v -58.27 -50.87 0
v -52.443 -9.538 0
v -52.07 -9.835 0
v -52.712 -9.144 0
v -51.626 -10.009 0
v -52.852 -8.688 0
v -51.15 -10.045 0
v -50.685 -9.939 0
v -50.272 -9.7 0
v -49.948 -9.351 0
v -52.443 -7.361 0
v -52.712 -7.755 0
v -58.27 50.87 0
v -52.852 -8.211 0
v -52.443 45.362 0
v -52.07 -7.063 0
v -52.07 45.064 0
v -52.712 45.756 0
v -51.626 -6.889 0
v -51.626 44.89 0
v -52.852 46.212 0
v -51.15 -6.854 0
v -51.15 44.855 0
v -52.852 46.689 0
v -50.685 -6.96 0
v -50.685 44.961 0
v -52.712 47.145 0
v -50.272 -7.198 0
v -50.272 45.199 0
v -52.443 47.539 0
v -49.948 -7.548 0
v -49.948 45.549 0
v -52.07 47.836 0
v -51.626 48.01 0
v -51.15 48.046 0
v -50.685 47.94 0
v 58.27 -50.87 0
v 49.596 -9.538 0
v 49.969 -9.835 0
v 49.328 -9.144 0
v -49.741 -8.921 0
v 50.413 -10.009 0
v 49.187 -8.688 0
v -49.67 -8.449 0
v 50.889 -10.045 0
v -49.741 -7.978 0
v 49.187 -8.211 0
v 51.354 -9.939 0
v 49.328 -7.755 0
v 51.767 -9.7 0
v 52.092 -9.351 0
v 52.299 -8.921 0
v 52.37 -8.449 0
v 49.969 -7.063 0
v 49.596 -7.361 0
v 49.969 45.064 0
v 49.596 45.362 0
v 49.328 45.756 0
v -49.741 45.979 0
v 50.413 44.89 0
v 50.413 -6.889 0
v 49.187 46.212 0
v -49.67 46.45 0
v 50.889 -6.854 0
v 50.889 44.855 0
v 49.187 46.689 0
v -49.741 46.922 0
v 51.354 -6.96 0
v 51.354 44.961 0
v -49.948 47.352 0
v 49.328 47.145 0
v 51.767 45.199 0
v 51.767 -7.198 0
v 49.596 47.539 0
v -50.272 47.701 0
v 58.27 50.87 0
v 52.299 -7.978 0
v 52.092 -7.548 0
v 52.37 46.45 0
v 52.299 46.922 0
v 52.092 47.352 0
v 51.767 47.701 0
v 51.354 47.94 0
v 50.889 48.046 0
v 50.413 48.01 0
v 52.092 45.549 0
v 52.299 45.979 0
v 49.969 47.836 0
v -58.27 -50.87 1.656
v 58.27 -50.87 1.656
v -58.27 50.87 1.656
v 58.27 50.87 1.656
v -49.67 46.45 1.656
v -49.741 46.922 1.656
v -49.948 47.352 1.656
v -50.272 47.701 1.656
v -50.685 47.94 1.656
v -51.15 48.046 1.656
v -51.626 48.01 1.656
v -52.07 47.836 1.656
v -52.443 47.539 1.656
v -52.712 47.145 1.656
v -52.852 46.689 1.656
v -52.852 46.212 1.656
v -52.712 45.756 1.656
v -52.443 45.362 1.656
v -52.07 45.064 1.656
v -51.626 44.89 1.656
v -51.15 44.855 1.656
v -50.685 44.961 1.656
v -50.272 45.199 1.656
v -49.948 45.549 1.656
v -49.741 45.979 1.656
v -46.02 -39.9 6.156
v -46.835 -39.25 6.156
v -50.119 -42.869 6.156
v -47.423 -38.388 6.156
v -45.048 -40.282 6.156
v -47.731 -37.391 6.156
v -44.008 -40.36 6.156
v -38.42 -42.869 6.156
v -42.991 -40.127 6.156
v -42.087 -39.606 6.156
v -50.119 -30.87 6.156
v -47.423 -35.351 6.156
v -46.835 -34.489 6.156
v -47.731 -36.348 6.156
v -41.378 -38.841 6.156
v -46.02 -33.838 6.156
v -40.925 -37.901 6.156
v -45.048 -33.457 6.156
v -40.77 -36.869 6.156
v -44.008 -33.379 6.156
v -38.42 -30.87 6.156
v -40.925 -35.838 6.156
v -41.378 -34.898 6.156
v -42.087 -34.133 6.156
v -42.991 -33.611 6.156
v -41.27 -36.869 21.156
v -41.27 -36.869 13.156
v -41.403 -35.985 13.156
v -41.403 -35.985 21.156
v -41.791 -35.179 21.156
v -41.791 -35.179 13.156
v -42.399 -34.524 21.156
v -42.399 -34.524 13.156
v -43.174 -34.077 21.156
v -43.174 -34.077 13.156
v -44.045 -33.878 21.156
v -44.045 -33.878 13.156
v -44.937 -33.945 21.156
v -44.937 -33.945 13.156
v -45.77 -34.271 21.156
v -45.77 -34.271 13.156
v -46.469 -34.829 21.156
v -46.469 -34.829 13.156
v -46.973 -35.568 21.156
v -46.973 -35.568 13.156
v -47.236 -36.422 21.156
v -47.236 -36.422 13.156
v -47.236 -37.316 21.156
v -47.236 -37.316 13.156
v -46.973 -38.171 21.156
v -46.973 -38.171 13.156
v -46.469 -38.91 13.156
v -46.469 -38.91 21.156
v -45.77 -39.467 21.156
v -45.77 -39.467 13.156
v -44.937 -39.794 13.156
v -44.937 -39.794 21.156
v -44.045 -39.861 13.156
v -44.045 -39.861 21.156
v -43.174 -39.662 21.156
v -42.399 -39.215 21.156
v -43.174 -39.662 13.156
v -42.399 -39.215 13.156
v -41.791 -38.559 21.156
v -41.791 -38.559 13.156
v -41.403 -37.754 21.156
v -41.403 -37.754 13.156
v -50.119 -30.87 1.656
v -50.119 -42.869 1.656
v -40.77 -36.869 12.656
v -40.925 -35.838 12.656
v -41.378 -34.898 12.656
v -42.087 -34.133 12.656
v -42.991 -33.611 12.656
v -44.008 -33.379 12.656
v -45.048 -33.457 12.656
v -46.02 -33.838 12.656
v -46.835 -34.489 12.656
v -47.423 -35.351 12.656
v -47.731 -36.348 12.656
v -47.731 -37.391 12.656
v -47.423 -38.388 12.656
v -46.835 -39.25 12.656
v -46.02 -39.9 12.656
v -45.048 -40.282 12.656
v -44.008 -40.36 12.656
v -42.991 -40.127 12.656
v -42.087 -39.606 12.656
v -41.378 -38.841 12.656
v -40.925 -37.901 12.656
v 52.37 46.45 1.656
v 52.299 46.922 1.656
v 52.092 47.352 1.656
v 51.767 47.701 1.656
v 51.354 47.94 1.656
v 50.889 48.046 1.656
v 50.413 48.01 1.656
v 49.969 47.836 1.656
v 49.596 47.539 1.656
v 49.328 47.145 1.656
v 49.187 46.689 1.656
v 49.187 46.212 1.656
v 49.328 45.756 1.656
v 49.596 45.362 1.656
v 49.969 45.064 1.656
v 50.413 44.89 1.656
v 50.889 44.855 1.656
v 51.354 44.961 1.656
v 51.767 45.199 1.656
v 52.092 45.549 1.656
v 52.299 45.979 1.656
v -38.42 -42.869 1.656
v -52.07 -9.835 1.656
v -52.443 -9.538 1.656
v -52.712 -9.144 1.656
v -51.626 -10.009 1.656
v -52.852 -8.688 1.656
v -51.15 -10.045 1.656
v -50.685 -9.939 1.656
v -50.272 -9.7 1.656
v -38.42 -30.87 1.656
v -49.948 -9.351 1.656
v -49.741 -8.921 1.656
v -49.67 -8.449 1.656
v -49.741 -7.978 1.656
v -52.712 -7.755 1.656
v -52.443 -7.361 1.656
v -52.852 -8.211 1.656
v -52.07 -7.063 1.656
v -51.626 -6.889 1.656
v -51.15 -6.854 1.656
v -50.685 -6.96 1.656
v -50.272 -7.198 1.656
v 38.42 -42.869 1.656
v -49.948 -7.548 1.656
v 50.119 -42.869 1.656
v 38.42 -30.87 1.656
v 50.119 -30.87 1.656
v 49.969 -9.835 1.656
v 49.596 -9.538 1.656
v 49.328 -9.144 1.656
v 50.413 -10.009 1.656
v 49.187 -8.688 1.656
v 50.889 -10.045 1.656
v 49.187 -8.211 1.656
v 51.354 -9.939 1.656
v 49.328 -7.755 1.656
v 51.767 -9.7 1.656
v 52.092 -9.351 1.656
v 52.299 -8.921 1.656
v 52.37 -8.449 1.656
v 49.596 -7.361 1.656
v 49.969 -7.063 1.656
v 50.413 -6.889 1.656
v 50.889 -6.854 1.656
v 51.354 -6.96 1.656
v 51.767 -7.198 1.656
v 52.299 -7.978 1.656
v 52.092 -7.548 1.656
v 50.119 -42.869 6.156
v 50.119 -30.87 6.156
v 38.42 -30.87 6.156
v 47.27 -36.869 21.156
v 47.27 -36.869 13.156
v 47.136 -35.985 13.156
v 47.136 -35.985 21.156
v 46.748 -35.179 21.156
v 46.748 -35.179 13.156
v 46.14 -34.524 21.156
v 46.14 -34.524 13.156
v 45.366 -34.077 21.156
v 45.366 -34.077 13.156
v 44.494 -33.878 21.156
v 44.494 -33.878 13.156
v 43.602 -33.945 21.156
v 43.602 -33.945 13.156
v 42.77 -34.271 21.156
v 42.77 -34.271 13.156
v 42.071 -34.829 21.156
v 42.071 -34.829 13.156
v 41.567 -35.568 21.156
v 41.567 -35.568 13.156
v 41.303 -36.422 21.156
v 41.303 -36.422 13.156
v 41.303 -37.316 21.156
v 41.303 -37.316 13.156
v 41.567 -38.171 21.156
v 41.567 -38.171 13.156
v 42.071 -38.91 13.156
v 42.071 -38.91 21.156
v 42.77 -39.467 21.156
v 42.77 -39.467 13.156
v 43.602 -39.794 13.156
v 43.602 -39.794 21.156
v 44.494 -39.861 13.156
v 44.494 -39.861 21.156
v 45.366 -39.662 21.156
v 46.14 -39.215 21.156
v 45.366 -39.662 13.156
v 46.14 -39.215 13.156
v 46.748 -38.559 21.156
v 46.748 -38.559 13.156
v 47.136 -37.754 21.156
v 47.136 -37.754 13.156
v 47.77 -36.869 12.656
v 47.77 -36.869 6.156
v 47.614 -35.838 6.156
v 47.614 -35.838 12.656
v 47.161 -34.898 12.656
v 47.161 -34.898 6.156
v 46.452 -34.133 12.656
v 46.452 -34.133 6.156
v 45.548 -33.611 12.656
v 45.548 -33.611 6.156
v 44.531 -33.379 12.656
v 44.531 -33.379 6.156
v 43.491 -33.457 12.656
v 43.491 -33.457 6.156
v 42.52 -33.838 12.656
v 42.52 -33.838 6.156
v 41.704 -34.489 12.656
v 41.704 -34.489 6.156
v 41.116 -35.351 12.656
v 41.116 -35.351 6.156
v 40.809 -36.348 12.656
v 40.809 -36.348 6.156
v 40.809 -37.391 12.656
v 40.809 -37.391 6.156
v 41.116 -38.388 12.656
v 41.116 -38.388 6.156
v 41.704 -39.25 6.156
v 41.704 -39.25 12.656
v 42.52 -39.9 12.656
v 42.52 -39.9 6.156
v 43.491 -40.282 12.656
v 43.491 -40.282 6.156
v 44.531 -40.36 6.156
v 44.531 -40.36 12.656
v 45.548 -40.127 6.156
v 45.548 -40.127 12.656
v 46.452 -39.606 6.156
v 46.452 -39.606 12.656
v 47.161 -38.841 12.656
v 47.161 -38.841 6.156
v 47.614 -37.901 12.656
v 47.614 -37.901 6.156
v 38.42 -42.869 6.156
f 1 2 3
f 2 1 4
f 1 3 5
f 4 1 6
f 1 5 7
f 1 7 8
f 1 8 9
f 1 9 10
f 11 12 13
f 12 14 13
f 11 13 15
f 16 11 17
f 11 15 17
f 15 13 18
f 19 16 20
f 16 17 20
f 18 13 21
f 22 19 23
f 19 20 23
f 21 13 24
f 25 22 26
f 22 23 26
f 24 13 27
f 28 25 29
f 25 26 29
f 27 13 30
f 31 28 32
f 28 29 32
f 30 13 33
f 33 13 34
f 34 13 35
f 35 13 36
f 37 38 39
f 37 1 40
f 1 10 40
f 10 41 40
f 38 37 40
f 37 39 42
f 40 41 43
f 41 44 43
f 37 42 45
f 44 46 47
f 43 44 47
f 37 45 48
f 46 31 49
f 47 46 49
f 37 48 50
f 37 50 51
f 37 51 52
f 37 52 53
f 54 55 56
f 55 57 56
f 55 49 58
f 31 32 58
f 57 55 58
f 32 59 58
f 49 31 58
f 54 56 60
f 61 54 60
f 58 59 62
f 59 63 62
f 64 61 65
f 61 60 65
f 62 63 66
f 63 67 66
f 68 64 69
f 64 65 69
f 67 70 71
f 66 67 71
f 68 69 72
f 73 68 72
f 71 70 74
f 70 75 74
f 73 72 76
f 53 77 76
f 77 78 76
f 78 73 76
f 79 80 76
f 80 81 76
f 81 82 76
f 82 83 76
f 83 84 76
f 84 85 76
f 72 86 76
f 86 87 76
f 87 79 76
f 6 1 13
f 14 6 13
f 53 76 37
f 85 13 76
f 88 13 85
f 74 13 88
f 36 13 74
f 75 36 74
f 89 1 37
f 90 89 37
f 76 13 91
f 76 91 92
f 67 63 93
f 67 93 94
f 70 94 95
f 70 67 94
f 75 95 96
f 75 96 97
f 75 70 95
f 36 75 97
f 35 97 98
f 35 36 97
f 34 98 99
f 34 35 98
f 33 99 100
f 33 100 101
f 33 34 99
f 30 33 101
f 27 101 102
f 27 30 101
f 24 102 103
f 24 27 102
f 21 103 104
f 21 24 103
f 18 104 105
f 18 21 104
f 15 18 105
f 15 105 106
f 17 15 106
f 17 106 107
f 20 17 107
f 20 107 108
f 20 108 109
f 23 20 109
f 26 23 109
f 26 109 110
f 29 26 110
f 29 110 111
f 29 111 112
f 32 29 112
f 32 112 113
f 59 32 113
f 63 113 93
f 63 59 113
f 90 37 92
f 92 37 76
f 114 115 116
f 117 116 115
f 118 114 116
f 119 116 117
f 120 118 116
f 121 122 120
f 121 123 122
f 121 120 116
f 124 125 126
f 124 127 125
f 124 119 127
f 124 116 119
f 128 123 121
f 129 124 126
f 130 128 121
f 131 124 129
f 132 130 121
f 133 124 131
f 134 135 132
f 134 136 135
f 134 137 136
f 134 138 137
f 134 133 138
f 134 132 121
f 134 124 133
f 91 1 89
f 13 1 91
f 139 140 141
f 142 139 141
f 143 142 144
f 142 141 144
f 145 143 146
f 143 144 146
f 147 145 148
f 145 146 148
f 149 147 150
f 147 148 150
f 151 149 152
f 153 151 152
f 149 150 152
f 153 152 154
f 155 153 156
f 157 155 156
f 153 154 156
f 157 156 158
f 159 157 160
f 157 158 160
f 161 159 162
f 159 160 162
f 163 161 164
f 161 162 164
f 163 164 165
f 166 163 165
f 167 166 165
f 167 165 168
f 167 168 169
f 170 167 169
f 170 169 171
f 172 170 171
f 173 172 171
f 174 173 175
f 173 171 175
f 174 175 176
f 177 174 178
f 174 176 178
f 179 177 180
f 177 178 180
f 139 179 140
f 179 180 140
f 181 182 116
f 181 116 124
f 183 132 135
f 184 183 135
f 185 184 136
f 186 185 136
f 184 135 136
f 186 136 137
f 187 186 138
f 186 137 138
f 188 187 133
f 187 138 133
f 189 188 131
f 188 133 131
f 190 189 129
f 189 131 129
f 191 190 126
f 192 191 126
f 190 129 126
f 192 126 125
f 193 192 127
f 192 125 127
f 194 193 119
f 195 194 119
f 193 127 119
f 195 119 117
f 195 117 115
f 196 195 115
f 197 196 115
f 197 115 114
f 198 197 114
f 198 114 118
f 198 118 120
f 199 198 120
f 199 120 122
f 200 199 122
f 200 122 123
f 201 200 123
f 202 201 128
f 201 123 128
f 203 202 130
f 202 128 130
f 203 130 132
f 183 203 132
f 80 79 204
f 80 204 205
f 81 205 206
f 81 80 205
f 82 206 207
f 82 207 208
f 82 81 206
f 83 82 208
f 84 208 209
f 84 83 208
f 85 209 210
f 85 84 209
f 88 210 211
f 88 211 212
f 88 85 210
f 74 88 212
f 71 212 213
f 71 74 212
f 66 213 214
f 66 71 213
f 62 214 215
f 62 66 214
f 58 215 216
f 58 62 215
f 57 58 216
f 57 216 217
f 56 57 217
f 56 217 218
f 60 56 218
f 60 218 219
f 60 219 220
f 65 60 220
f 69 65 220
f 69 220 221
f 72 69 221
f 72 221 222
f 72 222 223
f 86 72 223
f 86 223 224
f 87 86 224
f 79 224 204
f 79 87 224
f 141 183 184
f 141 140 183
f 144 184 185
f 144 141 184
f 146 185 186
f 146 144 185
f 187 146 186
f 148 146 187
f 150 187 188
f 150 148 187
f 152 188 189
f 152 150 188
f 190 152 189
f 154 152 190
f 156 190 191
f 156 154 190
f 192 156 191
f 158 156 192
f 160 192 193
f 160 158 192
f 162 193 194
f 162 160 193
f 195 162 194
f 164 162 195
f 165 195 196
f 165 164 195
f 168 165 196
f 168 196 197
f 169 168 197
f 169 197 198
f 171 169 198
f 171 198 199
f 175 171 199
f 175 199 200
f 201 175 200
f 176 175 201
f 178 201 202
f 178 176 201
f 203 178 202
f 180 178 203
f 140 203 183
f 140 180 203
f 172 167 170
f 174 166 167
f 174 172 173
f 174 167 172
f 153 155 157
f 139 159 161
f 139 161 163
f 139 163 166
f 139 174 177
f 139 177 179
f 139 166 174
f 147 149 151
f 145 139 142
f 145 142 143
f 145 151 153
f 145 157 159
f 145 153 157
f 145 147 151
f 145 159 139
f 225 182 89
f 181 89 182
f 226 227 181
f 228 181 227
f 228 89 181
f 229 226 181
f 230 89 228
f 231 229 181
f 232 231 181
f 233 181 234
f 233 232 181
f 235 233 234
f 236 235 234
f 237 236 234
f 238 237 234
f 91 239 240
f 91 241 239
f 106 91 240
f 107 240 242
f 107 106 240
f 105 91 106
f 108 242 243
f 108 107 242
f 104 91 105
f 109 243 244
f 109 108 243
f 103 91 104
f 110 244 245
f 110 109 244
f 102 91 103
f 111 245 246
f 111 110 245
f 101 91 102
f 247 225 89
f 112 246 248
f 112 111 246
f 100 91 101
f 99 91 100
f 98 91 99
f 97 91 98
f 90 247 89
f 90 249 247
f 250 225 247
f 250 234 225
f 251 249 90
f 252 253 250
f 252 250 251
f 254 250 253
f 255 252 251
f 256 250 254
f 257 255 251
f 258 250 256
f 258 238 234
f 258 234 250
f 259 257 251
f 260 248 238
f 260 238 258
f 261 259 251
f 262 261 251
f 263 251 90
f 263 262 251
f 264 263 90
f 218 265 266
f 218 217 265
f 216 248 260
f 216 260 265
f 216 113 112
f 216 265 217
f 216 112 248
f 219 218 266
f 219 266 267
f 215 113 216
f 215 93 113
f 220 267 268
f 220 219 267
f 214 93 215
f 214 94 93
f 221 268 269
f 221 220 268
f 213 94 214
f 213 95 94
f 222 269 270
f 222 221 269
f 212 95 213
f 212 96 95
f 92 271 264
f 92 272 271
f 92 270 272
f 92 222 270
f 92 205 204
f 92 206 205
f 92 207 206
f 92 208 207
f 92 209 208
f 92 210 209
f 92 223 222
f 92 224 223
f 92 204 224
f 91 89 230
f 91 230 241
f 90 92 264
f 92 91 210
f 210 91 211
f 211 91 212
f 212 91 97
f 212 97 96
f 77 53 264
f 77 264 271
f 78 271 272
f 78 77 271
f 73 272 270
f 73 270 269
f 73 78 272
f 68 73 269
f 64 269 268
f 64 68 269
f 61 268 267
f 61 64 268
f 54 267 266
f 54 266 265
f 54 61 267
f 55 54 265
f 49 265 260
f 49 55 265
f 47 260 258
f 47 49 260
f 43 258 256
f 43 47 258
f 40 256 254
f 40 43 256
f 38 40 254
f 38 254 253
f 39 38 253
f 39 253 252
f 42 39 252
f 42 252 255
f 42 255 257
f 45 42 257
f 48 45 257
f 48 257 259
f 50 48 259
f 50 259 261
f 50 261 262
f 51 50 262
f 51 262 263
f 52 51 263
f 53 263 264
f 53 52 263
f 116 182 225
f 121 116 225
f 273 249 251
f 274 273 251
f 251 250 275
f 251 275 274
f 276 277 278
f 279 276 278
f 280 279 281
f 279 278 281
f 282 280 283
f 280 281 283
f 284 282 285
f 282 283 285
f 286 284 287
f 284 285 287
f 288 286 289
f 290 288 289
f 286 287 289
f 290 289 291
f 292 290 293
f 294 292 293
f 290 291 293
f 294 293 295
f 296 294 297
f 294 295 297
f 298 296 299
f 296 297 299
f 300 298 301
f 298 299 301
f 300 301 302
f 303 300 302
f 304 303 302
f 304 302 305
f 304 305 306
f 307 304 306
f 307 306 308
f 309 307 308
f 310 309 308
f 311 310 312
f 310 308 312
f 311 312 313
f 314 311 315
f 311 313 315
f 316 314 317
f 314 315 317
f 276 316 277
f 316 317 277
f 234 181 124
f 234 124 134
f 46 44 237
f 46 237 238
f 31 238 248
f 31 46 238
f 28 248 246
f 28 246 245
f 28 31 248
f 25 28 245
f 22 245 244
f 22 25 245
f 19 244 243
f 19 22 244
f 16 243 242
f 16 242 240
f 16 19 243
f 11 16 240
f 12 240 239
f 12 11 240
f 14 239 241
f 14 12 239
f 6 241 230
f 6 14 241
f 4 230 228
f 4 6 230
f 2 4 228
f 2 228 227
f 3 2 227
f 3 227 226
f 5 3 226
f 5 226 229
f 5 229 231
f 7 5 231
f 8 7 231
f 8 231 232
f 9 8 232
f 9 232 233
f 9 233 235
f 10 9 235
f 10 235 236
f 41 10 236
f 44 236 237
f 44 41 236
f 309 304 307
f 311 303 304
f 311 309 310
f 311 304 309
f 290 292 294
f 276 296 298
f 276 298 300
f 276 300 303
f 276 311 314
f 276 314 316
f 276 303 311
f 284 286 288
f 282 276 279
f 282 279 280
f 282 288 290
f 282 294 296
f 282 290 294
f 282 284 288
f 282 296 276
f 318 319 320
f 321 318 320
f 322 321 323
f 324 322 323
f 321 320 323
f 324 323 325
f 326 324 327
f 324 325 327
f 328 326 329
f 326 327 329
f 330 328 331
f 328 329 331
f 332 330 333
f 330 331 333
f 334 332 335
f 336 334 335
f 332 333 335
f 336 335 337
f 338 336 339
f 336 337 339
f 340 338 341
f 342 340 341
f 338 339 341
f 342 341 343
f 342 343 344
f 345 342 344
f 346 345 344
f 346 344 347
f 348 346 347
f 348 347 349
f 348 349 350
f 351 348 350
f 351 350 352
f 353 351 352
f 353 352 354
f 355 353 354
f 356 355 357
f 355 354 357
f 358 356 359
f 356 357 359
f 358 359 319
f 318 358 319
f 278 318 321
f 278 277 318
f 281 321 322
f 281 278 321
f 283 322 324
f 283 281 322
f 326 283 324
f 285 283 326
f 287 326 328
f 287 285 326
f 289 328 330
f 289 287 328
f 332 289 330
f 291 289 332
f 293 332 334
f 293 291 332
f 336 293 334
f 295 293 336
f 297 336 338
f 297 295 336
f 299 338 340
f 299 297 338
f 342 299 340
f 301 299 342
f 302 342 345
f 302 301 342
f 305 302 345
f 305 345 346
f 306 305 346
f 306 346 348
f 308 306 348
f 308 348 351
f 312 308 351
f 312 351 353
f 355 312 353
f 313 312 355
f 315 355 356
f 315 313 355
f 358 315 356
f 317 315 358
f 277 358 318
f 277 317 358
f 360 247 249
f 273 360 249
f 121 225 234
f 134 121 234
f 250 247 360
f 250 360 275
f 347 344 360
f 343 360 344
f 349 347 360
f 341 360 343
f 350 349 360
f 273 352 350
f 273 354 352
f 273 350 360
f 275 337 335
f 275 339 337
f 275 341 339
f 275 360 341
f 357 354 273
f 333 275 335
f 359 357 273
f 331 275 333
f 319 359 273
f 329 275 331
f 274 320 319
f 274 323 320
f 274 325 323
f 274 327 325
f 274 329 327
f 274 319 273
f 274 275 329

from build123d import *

# Parameters (mm, degrees)
SKETCH1_W           = 116.54028
SKETCH1_H           = 101.7397
SKETCH1_R           = 1.6002
BOSS_EXTRUDE1_DEPTH = 1.65608
SKETCH2_W           = 11.69924
SKETCH2_H           = 11.99896
BOSS_EXTRUDE2_DEPTH = 4.5
SKETCH3_R           = 3.5
BOSS_EXTRUDE3_DEPTH = 7
CHAMFER1_SIZE       = 0.5
SKETCH5_R           = 3
BOSS_EXTRUDE4_DEPTH = 8


with BuildPart() as part:
    # Sketch1 → Boss-Extrude1 (new body)
    with BuildSketch(Plane.XY):
        Rectangle(SKETCH1_W, SKETCH1_H)
        with Locations((-51.2699, 46.45025)):
            Circle(SKETCH1_R, mode=Mode.SUBTRACT)
        with Locations((50.76952, 46.45025)):
            Circle(SKETCH1_R, mode=Mode.SUBTRACT)
        with Locations((50.76952, -8.44931)):
            Circle(SKETCH1_R, mode=Mode.SUBTRACT)
        with Locations((-51.2699, -8.44931)):
            Circle(SKETCH1_R, mode=Mode.SUBTRACT)
    extrude(amount=BOSS_EXTRUDE1_DEPTH)

    # Sketch2 → Boss-Extrude2 (add)
    with BuildSketch(Plane.XY.offset(1.65608)):
        with Locations((-44.26966, -36.86937)):
            Rectangle(SKETCH2_W, SKETCH2_H)
        with Locations((44.26966, -36.86937)):
            Rectangle(SKETCH2_W, SKETCH2_H)
    extrude(amount=BOSS_EXTRUDE2_DEPTH)

    # Sketch3 → Boss-Extrude3 (add)
    with BuildSketch(Plane.XY.offset(6.15608)):
        with Locations((-44.26966, -36.86937)):
            Circle(SKETCH3_R)
        with Locations((44.26966, -36.86937)):
            Circle(SKETCH3_R)
    extrude(amount=BOSS_EXTRUDE3_DEPTH)

    # Chamfer1
    chamfer1_edges = [part.edges().sort_by_distance(p)[0] for p in [
        (-47.76966, -36.86937, 13.15608),
        (40.76966, -36.86937, 13.15608),
    ]]
    chamfer(chamfer1_edges, length=CHAMFER1_SIZE)

    # Sketch5 → Boss-Extrude4 (add)
    with BuildSketch(Plane.XY.offset(13.15608)):
        with Locations((44.26966, -36.86937)):
            Circle(SKETCH5_R)
        with Locations((-44.26966, -36.86937)):
            Circle(SKETCH5_R)
    extrude(amount=BOSS_EXTRUDE4_DEPTH)


solid = part.part
